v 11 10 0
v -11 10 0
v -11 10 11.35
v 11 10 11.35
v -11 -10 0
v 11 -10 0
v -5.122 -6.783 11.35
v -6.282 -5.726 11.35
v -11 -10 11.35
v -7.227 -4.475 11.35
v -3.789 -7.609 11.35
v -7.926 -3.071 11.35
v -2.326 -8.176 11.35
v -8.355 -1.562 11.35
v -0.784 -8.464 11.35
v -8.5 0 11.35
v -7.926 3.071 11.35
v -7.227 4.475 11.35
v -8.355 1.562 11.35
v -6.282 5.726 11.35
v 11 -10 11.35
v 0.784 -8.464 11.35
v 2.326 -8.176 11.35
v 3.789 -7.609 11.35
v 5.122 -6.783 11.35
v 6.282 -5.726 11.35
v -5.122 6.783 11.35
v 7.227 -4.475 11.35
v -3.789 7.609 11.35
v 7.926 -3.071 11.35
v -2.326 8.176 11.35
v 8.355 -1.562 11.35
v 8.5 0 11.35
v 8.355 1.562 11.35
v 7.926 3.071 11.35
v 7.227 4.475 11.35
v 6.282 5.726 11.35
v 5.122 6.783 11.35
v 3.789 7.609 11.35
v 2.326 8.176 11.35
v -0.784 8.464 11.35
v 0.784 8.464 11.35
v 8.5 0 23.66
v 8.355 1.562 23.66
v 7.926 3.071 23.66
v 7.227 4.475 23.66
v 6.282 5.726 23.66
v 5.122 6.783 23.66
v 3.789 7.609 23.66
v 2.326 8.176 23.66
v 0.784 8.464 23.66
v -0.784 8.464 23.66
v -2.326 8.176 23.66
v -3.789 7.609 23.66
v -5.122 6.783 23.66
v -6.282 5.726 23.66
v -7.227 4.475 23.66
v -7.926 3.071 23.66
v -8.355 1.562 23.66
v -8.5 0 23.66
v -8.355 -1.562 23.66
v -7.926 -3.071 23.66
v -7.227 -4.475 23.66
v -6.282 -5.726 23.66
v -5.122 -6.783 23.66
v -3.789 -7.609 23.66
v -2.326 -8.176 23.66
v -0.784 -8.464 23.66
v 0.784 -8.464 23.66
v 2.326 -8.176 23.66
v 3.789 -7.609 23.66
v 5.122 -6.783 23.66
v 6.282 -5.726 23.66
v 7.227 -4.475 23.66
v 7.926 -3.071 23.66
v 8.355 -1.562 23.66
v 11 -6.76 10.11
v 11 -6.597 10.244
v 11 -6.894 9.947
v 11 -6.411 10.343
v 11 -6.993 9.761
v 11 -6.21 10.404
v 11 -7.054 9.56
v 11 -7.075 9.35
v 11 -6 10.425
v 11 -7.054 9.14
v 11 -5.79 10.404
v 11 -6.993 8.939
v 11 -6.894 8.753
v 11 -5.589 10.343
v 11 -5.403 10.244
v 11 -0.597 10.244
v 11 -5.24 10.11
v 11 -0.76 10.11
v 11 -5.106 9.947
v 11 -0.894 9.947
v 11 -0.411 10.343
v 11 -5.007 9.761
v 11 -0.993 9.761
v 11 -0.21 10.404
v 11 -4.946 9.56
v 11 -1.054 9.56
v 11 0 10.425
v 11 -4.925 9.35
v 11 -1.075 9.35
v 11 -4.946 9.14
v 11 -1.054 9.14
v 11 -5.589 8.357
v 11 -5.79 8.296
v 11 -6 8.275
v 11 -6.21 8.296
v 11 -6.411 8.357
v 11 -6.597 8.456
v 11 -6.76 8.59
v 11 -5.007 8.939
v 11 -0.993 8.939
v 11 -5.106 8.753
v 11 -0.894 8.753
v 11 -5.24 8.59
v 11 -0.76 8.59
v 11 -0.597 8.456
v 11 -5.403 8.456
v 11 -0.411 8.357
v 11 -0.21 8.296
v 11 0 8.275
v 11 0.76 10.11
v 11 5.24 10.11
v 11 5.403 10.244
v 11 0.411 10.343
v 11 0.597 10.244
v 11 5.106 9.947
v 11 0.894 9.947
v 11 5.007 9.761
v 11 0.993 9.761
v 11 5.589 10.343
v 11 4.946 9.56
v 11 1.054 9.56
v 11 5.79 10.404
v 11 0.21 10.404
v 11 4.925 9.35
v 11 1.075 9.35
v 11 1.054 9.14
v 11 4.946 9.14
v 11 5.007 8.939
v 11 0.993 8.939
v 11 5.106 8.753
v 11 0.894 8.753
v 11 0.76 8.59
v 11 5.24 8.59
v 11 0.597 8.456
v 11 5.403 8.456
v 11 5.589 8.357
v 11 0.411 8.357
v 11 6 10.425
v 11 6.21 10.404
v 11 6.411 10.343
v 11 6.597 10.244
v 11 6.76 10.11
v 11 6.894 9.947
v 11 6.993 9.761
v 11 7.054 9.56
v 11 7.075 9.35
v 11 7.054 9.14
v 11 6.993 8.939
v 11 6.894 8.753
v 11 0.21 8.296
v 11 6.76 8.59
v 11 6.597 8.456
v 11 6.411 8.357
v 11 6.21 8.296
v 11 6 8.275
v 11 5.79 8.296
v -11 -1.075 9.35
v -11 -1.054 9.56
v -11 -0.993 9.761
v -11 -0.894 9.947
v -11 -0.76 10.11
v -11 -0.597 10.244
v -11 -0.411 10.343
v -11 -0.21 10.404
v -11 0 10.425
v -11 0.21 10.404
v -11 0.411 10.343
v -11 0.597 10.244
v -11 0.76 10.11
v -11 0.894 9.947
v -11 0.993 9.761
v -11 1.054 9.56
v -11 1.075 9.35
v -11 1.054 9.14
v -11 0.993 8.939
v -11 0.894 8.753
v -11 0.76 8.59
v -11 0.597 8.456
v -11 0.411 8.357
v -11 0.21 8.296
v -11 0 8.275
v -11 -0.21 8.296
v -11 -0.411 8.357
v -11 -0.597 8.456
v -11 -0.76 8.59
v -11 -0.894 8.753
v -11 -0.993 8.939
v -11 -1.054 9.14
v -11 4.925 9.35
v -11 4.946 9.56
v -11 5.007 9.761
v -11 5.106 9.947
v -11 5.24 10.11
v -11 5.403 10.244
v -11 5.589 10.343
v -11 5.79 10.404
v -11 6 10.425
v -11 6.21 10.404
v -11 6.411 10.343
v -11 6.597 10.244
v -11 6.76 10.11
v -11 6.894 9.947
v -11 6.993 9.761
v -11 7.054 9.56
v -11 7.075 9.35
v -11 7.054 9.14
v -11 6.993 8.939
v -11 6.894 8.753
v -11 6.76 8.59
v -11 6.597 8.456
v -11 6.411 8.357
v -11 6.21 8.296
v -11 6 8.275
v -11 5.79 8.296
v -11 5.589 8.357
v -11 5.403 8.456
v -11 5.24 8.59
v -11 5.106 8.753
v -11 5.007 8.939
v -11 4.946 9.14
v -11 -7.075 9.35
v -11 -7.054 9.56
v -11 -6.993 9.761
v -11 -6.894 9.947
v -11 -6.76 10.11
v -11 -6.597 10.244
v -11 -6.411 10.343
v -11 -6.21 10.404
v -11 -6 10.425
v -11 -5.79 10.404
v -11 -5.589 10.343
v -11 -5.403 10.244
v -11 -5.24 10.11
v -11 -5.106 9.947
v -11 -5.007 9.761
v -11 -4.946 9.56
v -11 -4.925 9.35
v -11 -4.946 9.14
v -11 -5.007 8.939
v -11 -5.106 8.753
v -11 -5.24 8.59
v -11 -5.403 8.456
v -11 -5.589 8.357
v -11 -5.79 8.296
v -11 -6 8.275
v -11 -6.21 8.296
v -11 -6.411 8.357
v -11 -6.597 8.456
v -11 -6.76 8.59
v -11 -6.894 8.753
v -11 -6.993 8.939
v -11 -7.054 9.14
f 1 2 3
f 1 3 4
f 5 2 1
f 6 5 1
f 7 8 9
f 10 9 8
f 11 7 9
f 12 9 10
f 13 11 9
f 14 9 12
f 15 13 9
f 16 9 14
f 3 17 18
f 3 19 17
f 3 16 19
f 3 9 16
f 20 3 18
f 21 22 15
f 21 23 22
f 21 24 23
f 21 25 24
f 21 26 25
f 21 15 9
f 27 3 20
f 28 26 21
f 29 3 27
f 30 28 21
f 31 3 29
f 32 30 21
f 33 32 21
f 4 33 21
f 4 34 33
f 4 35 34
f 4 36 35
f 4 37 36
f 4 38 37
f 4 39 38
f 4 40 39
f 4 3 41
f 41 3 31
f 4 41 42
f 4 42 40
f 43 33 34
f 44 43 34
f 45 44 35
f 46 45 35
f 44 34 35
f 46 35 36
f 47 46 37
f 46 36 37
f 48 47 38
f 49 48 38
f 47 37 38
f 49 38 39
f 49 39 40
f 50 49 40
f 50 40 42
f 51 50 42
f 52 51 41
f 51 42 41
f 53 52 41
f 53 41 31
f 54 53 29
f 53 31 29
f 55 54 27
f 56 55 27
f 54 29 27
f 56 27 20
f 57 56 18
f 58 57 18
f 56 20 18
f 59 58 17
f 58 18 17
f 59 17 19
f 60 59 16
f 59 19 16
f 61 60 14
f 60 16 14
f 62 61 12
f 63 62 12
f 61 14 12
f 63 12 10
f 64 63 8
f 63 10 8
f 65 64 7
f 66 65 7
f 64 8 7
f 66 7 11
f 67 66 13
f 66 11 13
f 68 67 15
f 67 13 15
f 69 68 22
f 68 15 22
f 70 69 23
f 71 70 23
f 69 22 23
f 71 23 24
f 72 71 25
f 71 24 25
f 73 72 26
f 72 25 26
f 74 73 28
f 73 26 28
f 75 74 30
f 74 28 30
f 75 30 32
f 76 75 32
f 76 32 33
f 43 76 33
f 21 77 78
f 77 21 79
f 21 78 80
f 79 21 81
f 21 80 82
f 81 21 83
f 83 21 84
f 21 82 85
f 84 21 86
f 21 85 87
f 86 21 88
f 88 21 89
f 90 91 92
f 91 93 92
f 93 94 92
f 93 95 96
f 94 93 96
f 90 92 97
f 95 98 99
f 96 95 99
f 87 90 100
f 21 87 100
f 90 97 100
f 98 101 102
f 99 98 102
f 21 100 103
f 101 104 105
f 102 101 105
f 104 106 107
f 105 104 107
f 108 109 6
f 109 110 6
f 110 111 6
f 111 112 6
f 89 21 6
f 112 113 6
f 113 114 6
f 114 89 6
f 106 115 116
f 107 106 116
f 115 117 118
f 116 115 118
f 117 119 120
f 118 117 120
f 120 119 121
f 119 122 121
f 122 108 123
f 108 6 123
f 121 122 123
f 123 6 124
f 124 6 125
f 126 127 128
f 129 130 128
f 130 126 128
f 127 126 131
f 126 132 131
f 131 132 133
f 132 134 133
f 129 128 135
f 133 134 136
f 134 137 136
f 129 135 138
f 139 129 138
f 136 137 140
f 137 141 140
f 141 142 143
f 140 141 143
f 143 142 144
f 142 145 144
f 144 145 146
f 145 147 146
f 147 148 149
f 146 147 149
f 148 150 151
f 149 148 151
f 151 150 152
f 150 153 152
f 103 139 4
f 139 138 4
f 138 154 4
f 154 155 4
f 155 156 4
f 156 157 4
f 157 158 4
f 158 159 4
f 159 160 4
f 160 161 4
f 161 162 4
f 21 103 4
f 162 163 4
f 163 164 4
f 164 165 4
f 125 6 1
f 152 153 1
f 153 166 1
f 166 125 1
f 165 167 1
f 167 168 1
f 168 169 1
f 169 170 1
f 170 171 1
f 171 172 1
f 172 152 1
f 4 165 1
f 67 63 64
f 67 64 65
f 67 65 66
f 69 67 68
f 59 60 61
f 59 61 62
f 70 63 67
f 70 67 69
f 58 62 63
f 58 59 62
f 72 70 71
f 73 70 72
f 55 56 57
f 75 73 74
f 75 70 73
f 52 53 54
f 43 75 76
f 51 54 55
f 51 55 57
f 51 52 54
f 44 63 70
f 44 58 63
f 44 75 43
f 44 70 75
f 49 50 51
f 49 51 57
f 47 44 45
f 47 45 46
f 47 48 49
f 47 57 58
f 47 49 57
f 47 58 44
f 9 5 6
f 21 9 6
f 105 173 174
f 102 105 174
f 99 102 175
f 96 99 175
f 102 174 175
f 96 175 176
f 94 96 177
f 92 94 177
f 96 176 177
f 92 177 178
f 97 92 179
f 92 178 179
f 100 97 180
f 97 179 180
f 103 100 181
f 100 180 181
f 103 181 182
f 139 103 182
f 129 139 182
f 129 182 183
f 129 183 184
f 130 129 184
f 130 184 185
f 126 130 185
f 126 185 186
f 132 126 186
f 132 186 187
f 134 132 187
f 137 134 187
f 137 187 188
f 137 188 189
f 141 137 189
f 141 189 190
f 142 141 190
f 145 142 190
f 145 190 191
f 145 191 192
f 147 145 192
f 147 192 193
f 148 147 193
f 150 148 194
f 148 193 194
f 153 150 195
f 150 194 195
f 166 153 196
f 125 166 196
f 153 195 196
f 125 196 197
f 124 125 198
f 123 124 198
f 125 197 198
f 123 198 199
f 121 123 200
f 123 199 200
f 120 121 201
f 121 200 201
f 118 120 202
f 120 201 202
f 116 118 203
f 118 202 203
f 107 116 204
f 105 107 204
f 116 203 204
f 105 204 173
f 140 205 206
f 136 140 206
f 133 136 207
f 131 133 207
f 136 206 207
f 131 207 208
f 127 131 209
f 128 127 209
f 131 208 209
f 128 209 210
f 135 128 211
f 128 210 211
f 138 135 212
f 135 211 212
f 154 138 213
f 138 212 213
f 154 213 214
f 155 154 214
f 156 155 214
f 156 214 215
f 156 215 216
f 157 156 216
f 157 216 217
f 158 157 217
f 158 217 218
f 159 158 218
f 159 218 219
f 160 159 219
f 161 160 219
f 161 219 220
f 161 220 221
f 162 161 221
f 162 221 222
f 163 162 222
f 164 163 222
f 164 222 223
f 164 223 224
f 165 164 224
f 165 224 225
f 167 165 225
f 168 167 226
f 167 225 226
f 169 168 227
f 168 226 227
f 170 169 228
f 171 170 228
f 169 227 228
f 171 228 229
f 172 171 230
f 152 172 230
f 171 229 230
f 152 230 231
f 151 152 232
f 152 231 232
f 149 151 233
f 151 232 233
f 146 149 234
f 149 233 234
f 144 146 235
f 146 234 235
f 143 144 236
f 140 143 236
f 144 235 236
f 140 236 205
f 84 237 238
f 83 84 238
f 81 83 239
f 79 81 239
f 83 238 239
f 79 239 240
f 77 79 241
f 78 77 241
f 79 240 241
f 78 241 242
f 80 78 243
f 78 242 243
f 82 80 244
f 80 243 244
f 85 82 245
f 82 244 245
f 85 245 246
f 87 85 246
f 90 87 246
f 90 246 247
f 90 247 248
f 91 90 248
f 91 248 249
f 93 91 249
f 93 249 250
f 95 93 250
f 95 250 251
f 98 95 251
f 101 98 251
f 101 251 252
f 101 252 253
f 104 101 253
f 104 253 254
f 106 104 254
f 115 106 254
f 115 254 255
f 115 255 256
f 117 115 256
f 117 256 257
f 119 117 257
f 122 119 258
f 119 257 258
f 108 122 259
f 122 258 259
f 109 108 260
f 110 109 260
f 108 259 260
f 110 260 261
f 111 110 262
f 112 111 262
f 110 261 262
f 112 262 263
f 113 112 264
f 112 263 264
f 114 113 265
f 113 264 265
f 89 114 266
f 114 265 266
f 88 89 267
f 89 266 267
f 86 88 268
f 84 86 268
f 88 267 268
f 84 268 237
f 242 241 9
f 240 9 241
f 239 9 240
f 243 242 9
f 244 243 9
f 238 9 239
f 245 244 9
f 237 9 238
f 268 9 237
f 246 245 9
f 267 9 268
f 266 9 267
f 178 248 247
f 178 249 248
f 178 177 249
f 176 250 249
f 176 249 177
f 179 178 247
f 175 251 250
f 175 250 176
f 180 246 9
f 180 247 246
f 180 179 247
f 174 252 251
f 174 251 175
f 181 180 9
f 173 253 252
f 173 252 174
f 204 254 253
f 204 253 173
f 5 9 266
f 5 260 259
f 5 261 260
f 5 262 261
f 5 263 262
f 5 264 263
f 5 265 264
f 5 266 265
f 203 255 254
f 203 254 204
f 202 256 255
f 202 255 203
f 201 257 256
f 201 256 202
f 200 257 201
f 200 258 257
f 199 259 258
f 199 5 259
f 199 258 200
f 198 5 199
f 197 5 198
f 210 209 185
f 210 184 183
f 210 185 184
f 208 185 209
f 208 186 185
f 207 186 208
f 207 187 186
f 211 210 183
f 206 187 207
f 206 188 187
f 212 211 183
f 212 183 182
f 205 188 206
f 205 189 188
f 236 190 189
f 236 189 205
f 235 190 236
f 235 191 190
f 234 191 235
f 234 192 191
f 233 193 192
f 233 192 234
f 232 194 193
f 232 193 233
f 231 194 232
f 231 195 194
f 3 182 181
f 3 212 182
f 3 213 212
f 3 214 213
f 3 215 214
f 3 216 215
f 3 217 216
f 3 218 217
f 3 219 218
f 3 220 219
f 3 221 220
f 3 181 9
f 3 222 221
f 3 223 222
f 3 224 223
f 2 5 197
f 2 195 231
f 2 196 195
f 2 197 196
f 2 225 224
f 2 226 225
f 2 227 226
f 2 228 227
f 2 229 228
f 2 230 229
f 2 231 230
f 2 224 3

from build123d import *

# Parameters (mm, degrees)
F0_W     = 22
F0_H     = 20
F1_DEPTH = 11.35
F2_R     = 1.075
F3_DEPTH = 22.001
F4_R     = 8.5
F5_DEPTH = 12.31


with BuildPart() as f1:
    # F0 (on Top) → F1 (new body)
    with BuildSketch(Plane.XY):
        Rectangle(F0_W, F0_H)
    extrude(amount=F1_DEPTH)

    # F2 (on face) → F3 (cut, through all)
    with BuildSketch(Plane(origin=(-11, 0, 0), x_dir=(0, -1, 0), z_dir=(-1, 0, 0))):
        with Locations((-6, 9.35)):
            Circle(F2_R)
        with Locations((0, 9.35)):
            Circle(F2_R)
        with Locations((6, 9.35)):
            Circle(F2_R)
    extrude(amount=-F3_DEPTH, mode=Mode.SUBTRACT)

    # F4 (on face) → F5 (join)
    with BuildSketch(Plane.XY.offset(11.35)):
        Circle(F4_R)
    extrude(amount=F5_DEPTH)


solid = f1.part
